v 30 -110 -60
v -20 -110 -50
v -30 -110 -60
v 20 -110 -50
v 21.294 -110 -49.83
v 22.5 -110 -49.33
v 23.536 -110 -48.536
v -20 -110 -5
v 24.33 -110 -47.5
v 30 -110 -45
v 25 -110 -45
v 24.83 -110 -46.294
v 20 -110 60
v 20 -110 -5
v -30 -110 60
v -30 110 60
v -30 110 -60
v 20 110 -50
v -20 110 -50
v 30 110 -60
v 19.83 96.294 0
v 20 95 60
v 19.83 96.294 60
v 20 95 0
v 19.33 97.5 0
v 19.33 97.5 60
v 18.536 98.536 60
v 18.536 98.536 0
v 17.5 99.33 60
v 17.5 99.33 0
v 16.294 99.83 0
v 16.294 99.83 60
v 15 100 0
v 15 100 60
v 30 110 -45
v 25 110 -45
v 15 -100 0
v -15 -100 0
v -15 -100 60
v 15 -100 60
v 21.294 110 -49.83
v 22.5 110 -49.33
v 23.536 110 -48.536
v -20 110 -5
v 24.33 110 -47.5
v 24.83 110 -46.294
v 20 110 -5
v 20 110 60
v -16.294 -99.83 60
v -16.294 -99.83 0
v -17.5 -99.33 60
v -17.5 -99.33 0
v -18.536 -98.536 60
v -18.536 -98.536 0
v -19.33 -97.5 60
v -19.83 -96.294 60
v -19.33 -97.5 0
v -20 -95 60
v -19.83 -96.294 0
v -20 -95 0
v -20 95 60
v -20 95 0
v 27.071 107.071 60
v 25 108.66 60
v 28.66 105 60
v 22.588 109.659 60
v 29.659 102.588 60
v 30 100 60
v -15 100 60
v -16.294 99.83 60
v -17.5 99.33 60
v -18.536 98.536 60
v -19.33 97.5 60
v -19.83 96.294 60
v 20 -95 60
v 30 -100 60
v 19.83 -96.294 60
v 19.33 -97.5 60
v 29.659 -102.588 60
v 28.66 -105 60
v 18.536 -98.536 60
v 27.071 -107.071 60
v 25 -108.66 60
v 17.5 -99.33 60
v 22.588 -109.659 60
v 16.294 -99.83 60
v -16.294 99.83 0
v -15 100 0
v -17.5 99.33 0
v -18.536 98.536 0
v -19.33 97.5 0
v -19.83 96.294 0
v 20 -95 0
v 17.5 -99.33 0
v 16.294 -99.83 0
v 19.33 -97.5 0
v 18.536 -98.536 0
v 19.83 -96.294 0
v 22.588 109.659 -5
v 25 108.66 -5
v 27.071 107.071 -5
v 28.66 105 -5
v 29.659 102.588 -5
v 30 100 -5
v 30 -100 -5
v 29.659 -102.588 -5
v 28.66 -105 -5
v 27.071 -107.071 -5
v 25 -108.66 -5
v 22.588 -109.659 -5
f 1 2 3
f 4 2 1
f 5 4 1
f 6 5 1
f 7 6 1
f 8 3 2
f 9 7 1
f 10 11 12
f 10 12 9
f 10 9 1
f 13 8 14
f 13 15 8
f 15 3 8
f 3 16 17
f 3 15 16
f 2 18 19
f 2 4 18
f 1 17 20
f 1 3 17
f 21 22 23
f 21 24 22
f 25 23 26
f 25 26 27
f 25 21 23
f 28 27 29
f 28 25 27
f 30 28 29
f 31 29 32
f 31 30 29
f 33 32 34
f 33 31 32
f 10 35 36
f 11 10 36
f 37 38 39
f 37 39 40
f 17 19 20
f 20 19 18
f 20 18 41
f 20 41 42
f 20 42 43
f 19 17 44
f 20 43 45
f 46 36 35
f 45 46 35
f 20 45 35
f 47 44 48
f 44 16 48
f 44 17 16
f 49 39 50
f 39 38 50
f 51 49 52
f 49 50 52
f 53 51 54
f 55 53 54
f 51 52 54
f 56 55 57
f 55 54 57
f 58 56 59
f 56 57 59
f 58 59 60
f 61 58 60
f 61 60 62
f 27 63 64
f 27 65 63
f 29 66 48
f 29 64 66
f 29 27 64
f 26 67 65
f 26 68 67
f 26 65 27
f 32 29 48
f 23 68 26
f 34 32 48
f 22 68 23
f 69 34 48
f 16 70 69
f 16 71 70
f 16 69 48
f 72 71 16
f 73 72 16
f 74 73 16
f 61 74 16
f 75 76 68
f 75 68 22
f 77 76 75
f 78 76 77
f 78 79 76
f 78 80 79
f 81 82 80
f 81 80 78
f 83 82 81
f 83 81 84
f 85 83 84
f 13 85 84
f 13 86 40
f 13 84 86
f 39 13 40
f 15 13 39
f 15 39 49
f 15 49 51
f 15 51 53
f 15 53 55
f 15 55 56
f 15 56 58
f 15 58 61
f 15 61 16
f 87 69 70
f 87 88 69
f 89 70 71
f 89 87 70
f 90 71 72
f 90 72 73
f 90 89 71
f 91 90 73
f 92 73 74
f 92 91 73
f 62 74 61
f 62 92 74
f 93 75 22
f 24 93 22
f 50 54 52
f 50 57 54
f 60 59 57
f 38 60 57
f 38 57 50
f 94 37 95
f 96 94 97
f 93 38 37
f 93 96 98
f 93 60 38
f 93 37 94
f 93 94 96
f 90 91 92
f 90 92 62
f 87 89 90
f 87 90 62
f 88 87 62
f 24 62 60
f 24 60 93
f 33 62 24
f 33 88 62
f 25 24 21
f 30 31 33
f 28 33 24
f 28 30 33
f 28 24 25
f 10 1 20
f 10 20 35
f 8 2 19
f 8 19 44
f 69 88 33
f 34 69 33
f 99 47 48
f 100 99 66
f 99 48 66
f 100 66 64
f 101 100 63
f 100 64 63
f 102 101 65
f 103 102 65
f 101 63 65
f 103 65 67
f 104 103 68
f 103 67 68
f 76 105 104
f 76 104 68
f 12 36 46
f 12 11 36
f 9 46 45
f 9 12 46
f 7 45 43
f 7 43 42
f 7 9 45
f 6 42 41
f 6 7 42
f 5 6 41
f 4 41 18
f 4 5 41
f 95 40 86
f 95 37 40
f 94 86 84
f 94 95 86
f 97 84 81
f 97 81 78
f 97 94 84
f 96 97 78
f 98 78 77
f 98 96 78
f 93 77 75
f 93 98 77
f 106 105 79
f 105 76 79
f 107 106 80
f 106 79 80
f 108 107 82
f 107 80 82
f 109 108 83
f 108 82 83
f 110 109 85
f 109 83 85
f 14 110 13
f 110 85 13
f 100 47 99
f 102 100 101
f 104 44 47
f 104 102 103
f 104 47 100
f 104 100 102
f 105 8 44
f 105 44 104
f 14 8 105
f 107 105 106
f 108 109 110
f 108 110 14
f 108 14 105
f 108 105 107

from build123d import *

# Parameters (mm, degrees)
F1_DEPTH = 110
F2_W     = 40
F2_H     = 200
F3_DEPTH = 60
F4_R     = 4.99999
F5_R     = 10


# Not quite as in the source:
# - a fillet or chamfer is up to 0.001 mm smaller than in the source, because OpenCascade refuses the exact size


with BuildPart() as f1:
    # F0 (on Front) → F1 (new body, symmetric)
    with BuildSketch(Plane.XZ):
        Polygon((-30, -60), (30, -60), (30, -50), (30, -45), (25, -45), (25, -50), (-20, -50), (-20, -5), (30, -5), (30, 60), (-30, 60), align=None)
    extrude(amount=F1_DEPTH, both=True)

    # F2 (on face) → F3 (cut)
    with BuildSketch(Plane.XY.offset(60)):
        Rectangle(F2_W, F2_H)
    extrude(amount=-F3_DEPTH, mode=Mode.SUBTRACT)

    # F4 (radius 5 in the source; OpenCascade refuses exactly that, so slightly less here)
    f4_edges = [f1.edges().sort_by_distance(p)[0] for p in [
        (-20, 100, 30),
        (20, 100, 30),
        (-20, -100, 30),
        (20, -100, 30),
        (25, 0, -50),
    ]]
    fillet(f4_edges, radius=F4_R)

    # F5
    f5_edges = [f1.edges().sort_by_distance(p)[0] for p in [
        (30, -110, 27.5),
        (30, 110, 27.5),
    ]]
    fillet(f5_edges, radius=F5_R)


solid = f1.part
